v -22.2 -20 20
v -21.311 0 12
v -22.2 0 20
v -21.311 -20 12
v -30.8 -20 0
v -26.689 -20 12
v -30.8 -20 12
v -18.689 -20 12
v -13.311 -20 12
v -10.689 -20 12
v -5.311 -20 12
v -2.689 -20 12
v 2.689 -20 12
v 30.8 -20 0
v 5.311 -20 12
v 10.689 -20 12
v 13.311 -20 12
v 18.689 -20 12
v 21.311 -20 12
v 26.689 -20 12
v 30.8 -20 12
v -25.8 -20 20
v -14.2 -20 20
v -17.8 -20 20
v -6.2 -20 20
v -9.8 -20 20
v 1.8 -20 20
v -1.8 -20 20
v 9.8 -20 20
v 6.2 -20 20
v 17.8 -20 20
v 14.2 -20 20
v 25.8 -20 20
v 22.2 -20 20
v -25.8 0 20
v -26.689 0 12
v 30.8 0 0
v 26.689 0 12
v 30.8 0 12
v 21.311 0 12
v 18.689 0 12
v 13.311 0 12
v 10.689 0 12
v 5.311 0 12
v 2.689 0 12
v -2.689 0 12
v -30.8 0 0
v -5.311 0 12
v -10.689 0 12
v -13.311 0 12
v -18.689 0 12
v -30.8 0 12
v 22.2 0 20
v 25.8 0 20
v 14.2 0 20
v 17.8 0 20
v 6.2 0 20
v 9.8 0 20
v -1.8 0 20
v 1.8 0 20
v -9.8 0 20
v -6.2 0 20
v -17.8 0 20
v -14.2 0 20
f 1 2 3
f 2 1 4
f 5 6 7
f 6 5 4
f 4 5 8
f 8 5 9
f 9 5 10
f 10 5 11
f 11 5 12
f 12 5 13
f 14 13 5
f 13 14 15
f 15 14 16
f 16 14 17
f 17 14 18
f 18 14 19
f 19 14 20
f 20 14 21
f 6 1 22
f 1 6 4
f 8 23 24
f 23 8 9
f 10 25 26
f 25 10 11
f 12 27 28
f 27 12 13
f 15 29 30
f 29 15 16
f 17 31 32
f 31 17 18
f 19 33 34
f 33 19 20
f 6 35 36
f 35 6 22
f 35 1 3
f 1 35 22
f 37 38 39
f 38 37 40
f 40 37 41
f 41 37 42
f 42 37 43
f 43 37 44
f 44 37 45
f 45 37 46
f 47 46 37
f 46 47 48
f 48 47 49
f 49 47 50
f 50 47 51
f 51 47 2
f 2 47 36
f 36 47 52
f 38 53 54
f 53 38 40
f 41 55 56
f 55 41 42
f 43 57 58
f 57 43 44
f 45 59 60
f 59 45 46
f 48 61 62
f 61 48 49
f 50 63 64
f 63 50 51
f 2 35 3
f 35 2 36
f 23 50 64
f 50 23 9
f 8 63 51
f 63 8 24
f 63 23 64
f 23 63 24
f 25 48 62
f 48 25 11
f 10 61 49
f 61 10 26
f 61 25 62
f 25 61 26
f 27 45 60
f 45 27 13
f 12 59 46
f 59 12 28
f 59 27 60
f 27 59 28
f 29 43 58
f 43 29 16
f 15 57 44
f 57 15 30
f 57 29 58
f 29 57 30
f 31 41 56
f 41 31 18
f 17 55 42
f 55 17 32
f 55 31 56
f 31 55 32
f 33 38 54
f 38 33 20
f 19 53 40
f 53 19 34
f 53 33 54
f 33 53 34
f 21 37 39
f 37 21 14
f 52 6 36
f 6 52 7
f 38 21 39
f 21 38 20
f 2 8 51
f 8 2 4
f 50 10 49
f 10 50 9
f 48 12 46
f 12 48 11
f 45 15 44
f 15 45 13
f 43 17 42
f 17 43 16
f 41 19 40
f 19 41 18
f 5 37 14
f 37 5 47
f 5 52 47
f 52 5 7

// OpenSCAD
$fn = 32;

// ----------------------------------------------------------------------
// Toothed rack, 7 teeth
// 8 mm pitch, 8 mm teeth
// ----------------------------------------------------------------------

// --- parameters (mm) ---
bar_w = 20;     // bar width (Y)
bar_h = 12;     // bar height (Z)
teeth = 7;      // number of teeth
pitch = 8;      // tooth pitch
tooth_h = 8;    // tooth height above the bar
root_w = 5.6;   // tooth width at the root
crest_w = 3.6;  // tooth width at the crest

// --- derived feature positions (mm) ---
span = (teeth - 1) * pitch;  // = 48   distance between the outer teeth
bar_l = span + root_w + 8;   // = 61.6   bar length: teeth plus 4 mm at each end
tooth_x = -span / 2;         // = -24   X of the first tooth
height = bar_h + tooth_h;    // = 20   overall height
feature_centers = [
  [tooth_x + 0 * pitch, -bar_w / 2],
  [tooth_x + 1 * pitch, -bar_w / 2],
  [tooth_x + 2 * pitch, -bar_w / 2],
  [tooth_x + 3 * pitch, -bar_w / 2],
  [tooth_x + 4 * pitch, -bar_w / 2],
  [tooth_x + 5 * pitch, -bar_w / 2],
  [tooth_x + 6 * pitch, -bar_w / 2]
];   // tooth centre line, drives the tooth loop

// bar with a rack of teeth, one extruded trapezoium per centre
module rack_tooth() {
  linear_extrude(height = bar_w)
    polygon(points = [
      [0, 0],
      [root_w, 0],
      [root_w / 2 + crest_w / 2, tooth_h + 1],
      [root_w / 2 - crest_w / 2, tooth_h + 1]
    ]);
}

union() {
  translate([-bar_l / 2, -bar_w, 0]) cube([bar_l, bar_w, bar_h]);
  for (centre = feature_centers)
    translate([centre[0] - root_w / 2, 0, bar_h - 1]) rotate([90, 0, 0]) rack_tooth();
}
